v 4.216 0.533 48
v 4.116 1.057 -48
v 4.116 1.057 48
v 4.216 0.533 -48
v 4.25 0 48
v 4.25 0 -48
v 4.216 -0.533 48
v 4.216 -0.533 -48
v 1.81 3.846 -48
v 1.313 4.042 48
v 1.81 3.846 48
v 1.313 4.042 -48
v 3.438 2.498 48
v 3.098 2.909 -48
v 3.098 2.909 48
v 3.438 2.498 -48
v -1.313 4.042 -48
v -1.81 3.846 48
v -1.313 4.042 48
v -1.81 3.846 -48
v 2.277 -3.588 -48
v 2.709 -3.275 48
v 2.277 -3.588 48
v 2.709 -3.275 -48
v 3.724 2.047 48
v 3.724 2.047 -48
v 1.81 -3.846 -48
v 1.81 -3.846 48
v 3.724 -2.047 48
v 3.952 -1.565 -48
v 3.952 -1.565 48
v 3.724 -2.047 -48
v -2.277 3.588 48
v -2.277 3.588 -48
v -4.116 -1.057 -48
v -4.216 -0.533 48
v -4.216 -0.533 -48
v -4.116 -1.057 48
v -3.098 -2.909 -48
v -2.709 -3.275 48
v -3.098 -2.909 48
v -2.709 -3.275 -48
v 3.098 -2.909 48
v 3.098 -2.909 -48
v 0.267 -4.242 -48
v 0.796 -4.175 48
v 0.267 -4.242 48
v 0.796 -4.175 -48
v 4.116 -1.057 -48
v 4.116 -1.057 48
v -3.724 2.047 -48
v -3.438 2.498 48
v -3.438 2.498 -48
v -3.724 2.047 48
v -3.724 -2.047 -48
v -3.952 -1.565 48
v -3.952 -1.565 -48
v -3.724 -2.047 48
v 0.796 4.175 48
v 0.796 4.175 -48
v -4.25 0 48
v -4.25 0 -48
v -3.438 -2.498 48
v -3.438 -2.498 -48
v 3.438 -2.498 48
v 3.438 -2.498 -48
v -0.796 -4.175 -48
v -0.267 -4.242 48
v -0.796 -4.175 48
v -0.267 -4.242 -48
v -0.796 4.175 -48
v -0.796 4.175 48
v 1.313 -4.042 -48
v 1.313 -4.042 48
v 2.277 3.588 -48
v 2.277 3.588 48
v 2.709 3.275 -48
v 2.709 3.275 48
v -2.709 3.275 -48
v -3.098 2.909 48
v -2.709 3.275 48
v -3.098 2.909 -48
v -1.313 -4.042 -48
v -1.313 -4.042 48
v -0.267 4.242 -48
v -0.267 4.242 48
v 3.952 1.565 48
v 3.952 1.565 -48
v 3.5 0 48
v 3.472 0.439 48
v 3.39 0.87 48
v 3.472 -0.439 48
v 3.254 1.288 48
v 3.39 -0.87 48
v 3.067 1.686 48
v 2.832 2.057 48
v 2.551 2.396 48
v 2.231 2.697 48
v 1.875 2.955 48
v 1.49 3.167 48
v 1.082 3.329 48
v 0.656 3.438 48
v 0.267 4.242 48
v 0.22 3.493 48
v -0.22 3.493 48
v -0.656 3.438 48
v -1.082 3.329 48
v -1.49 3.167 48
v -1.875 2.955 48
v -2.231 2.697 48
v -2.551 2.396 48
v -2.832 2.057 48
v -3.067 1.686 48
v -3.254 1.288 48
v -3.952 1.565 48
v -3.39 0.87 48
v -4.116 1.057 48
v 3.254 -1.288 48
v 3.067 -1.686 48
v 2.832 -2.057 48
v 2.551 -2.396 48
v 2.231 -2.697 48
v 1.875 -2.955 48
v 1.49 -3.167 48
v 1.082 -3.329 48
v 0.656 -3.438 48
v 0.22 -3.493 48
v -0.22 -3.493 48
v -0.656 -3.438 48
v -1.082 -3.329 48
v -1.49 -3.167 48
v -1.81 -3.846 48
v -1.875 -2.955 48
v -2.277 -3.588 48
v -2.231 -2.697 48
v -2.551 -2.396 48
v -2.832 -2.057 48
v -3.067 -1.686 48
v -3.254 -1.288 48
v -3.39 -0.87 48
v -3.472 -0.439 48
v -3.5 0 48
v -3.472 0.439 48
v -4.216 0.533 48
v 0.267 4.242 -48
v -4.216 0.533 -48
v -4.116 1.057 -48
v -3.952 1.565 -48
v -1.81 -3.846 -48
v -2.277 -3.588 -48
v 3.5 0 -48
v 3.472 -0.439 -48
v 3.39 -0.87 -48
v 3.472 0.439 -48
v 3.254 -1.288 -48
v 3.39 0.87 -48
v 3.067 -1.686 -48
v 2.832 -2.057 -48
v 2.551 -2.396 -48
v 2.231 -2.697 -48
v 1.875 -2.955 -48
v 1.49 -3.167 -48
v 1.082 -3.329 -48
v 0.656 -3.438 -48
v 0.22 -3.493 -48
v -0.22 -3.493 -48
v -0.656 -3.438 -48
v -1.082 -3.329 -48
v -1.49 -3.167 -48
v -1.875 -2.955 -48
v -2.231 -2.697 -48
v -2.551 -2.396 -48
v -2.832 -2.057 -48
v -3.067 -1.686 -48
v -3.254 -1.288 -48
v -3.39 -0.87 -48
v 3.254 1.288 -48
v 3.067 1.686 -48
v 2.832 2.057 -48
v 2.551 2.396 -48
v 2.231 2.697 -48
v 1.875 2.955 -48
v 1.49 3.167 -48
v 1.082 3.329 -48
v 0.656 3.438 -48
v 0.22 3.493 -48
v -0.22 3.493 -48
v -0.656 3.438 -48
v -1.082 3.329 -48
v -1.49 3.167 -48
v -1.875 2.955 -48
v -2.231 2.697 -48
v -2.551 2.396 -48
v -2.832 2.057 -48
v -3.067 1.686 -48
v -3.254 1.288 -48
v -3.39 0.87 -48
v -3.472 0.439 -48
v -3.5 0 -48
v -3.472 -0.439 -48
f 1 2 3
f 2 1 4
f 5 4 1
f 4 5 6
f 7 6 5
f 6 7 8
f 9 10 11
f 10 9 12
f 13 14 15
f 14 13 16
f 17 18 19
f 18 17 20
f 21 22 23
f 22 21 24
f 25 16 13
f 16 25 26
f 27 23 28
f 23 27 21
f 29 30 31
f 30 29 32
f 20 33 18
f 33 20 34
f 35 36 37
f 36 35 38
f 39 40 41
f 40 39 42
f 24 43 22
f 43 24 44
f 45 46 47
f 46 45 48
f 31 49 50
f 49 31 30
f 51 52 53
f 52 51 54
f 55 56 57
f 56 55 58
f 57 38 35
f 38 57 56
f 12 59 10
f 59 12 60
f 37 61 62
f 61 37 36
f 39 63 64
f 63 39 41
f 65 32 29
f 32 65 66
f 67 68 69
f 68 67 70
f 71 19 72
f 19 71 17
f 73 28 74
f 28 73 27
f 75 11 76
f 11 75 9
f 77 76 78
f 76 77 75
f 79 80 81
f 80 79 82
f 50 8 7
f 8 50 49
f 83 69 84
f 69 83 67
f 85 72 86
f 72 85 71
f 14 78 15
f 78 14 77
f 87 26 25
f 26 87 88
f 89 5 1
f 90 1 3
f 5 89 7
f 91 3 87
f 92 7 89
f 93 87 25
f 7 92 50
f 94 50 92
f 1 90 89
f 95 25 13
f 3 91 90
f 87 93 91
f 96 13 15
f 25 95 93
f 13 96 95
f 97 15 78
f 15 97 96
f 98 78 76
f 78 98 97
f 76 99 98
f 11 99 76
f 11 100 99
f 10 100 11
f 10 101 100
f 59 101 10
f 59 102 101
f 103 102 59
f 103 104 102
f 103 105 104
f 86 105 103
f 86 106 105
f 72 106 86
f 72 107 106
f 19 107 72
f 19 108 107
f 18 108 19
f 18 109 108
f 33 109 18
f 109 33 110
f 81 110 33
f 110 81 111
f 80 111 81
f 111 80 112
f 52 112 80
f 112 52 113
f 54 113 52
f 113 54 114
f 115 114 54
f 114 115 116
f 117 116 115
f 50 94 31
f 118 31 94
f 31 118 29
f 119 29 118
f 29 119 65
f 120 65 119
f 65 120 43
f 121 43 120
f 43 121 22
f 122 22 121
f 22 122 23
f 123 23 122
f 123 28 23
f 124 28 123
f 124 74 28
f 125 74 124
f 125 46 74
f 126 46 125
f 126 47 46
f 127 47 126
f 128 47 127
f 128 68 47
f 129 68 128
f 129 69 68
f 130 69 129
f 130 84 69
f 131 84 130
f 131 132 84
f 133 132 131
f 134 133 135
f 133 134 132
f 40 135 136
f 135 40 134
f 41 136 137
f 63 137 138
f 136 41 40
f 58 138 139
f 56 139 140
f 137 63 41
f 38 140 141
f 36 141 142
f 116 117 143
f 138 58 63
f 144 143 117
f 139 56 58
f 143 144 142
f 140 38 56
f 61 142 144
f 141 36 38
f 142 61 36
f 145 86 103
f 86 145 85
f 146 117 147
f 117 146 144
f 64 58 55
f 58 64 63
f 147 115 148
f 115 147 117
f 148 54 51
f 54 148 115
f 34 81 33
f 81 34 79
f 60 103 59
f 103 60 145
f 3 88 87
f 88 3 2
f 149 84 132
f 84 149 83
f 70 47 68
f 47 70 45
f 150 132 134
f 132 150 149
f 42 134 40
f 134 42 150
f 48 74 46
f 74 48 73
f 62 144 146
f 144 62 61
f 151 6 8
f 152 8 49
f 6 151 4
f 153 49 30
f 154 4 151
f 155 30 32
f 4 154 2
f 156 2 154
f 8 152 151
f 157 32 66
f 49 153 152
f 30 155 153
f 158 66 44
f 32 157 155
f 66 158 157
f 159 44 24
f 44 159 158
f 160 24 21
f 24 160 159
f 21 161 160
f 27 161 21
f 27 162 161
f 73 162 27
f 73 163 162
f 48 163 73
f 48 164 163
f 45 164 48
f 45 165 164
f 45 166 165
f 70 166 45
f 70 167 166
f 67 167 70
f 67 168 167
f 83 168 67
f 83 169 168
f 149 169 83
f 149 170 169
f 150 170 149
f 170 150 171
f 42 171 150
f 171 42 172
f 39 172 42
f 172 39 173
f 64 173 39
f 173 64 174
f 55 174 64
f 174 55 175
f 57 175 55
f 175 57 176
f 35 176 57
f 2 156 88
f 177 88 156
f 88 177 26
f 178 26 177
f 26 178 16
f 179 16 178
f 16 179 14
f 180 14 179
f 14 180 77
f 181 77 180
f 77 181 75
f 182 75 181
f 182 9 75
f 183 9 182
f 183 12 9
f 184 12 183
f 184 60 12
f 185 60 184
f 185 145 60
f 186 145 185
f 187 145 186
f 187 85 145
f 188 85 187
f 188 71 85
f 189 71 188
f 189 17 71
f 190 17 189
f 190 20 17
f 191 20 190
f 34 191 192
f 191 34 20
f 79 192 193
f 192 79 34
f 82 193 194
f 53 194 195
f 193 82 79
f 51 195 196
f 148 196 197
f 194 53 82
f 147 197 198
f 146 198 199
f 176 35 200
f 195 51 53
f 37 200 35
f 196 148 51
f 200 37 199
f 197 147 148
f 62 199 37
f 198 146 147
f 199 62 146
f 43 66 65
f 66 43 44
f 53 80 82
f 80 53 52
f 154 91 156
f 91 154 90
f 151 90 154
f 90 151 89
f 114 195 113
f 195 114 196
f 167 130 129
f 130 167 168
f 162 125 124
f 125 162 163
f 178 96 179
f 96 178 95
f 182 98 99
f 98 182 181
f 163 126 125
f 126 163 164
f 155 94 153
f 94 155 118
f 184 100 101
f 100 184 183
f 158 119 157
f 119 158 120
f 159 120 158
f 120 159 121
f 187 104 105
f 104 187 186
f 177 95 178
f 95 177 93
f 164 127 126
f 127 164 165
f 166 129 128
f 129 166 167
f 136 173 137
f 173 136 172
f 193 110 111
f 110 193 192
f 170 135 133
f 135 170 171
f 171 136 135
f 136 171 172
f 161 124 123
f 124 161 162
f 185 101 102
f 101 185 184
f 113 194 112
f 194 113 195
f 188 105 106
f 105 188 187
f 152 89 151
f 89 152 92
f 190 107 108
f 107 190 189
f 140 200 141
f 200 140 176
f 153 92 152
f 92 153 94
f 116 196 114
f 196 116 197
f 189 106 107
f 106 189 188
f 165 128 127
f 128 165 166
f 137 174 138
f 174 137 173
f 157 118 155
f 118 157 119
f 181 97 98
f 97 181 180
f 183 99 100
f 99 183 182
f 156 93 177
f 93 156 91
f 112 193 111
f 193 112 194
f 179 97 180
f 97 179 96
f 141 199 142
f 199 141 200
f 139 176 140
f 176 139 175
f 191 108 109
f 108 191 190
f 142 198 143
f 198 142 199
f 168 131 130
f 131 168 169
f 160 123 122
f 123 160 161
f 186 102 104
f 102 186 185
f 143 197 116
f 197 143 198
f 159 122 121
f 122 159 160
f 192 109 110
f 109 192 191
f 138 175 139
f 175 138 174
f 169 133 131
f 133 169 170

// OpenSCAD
$fn = 50;


difference() {
	union() {
		translate(v = [0, 0, -48.0000000000]) {
			cylinder(h = 96, r = 4.2500000000);
		}
	}
	union() {
		translate(v = [0, 0, -100.0000000000]) {
			cylinder(h = 200, r = 3.5000000000);
		}
	}
}
